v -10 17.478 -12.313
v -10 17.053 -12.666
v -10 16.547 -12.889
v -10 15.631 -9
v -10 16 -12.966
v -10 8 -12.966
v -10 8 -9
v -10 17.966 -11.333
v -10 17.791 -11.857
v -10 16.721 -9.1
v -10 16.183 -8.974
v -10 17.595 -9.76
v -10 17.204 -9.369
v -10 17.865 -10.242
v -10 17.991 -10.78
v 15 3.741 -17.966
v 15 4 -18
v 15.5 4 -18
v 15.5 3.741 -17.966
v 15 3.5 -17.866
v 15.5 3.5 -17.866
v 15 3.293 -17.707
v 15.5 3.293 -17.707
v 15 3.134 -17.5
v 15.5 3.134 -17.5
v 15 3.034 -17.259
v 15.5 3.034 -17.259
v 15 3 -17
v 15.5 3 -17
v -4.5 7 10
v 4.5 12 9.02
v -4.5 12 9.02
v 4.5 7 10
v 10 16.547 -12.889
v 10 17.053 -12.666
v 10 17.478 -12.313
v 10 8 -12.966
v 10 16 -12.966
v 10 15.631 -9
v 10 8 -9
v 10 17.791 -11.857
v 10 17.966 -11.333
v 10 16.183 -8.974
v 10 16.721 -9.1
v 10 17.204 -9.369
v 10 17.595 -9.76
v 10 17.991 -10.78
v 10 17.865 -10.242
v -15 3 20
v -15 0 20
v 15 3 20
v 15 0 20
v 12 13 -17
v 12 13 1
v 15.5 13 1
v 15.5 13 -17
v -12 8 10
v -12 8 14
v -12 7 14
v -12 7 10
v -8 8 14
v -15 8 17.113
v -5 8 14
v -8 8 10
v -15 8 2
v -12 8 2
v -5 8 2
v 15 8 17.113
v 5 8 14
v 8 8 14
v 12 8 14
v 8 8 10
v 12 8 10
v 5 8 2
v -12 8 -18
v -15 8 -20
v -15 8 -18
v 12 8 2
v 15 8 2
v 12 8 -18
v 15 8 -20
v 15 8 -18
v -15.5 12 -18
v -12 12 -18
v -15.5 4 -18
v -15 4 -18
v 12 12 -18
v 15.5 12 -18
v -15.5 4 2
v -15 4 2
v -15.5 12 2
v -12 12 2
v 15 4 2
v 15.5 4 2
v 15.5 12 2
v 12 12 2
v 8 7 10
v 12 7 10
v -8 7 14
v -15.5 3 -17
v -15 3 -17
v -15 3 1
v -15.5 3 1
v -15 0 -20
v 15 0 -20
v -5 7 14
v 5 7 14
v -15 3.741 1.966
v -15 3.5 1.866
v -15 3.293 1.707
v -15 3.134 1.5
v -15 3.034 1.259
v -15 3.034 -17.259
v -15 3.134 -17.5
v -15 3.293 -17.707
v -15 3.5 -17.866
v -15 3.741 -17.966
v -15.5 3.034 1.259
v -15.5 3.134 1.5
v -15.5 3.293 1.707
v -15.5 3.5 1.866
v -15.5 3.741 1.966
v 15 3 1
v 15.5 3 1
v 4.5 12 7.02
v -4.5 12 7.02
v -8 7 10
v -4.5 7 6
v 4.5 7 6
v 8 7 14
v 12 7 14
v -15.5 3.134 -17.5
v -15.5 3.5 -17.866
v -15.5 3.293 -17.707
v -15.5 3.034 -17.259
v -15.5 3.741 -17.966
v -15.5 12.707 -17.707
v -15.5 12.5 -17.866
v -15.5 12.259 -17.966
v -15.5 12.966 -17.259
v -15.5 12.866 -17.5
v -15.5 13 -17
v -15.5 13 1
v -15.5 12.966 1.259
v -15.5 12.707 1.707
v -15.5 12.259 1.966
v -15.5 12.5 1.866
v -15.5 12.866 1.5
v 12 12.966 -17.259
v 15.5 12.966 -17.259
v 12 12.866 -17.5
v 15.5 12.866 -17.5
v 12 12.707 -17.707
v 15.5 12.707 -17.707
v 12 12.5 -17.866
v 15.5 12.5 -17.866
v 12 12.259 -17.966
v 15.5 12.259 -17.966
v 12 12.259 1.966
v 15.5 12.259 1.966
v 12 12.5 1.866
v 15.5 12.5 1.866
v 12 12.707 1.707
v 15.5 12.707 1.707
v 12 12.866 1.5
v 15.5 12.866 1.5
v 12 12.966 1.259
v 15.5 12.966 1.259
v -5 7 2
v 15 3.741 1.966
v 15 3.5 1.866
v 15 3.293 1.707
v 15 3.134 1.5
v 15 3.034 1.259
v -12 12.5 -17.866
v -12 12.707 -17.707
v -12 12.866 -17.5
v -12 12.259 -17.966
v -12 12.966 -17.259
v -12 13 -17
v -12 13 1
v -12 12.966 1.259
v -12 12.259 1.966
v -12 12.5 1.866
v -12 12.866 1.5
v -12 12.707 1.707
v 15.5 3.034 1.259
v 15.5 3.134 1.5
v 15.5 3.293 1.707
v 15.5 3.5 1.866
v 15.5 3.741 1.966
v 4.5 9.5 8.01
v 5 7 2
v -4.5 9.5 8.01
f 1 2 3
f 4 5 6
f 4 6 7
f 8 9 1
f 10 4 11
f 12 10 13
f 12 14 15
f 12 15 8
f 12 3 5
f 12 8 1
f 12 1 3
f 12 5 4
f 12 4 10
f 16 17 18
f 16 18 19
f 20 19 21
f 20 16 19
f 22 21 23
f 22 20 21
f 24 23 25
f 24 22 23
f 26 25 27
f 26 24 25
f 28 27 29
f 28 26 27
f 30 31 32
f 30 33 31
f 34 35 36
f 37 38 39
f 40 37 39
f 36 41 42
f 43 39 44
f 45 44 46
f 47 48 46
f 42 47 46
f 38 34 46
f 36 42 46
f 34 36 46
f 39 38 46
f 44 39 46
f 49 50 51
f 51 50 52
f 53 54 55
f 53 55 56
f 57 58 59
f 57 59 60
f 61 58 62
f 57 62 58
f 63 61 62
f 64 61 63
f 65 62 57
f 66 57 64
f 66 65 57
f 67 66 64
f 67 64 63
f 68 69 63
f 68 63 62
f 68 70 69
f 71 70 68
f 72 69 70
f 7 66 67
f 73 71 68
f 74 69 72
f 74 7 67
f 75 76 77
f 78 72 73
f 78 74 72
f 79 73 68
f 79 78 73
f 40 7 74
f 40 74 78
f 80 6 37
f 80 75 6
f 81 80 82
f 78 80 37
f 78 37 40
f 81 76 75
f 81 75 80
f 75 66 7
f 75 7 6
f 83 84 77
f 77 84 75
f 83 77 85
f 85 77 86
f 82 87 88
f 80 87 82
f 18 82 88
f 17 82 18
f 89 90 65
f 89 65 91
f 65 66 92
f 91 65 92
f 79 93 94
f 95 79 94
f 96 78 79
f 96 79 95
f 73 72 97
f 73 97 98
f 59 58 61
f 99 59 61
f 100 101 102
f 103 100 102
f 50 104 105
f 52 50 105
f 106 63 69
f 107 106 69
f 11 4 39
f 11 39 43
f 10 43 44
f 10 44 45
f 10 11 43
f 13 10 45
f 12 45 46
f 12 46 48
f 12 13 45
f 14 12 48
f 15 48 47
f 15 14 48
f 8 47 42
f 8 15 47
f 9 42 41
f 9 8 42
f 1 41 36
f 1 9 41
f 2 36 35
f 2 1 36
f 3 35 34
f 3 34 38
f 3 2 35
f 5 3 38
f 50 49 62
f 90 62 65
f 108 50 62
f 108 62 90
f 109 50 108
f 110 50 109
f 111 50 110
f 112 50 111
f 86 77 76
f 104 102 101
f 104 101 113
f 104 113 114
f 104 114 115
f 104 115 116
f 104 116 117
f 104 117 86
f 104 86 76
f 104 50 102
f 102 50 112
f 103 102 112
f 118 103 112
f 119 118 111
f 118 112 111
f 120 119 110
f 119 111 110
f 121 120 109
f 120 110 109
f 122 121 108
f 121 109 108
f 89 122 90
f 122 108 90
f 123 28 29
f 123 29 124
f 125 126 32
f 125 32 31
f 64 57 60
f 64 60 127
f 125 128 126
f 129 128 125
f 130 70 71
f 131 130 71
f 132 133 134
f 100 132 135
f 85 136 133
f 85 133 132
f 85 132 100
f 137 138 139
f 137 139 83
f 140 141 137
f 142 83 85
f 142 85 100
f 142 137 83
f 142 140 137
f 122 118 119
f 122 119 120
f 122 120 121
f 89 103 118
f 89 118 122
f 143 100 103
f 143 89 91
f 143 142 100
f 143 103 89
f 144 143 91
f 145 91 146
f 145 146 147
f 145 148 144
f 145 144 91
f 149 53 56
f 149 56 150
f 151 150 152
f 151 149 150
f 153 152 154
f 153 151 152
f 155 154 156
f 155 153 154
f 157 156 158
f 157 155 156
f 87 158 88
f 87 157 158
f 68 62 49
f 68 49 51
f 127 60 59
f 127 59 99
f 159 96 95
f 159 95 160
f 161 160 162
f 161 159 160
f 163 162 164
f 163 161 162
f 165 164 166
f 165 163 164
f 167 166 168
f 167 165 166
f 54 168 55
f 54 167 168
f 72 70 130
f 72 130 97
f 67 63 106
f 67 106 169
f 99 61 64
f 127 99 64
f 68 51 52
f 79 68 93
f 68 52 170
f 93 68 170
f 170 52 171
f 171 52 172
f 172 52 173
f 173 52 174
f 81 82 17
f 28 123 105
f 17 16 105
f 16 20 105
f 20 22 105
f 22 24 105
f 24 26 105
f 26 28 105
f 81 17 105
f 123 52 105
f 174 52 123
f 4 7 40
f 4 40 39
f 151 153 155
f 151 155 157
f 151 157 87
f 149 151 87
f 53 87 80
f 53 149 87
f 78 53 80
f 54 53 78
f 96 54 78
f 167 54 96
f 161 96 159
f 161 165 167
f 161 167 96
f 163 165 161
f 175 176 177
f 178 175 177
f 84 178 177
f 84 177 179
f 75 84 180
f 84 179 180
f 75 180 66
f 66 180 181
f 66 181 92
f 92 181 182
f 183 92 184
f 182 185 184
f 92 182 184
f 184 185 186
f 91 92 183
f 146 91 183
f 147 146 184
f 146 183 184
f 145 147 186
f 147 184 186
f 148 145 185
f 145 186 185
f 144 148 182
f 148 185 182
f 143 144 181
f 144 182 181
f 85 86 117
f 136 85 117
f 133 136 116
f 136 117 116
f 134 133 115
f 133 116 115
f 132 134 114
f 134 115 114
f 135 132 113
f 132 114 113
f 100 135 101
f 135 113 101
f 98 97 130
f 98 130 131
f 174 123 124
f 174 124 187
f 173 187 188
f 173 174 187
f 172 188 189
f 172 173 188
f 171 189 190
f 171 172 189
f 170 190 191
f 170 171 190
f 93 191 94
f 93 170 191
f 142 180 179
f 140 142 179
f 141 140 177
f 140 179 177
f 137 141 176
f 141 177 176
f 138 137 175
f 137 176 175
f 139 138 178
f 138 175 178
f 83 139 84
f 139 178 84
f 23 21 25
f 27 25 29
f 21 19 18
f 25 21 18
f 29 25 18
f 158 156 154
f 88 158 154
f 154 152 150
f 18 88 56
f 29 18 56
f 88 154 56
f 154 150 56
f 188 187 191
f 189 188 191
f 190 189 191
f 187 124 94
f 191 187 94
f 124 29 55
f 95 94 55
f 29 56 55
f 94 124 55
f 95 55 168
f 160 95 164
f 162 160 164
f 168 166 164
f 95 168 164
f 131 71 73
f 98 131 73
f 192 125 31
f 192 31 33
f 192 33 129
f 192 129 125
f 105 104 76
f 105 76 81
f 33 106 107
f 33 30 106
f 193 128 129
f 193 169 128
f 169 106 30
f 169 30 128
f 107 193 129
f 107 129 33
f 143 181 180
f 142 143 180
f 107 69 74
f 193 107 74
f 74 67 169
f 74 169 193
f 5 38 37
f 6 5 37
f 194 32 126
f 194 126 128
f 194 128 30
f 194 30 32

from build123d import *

# Parameters (mm, degrees)
SKETCH_1_W           = 30
SKETCH_1_H           = 40
EXTRUDE_1_DEPTH      = 8
CHAMFER_1_SIZE       = 5
CHAMFER_1_SIZE2      = 2.886751346
EXTRUDE_START        = -3
EXTRUDE_2_DEPTH      = 3.5
EXTRUDE_3_DEPTH      = 10
EXTRUDE_3_DEPTH_BACK = 10
SKETCH_4_W           = 4
SKETCH_4_H           = 4
CUT_EXTRUDE_2_DEPTH  = 1
SKETCH_12_W          = 10
SKETCH_12_H          = 12
CUT_EXTRUDE_3_DEPTH  = 1


with BuildPart() as part:
    # 草图1 → 凸台-拉伸1 (new body)
    with BuildSketch(Plane(origin=(0, 0, 0), x_dir=(1, 0, 0), z_dir=(0, 1, 0))):
        Rectangle(SKETCH_1_W, SKETCH_1_H)
    extrude(amount=EXTRUDE_1_DEPTH)

    # 倒角1
    chamfer_1_edges = [part.edges().sort_by_distance(p)[0] for p in [
        (0, 8, 20),
    ]]
    chamfer_1_side = [part.faces().sort_by_distance(p)[0] for p in [
        (0, 4, 20),
    ]]
    chamfer(chamfer_1_edges, length=CHAMFER_1_SIZE, length2=CHAMFER_1_SIZE2, reference=chamfer_1_side[0])

    # 草图6 → 凸台-拉伸2 (add)
    with BuildSketch(Plane(origin=(15, 0, 0), x_dir=(0, 0, -1), z_dir=(1, 0, 0)).offset(EXTRUDE_START)):
        with BuildLine():
            Line((18, 12), (18, 4))
            ThreePointArc((18, 4), (17.707106781, 3.292893219), (17, 3))
            Line((17, 3), (-1, 3))
            ThreePointArc((-1, 3), (-1.707106781, 3.292893219), (-2, 4))
            Line((-2, 4), (-2, 12))
            ThreePointArc((-2, 12), (-1.707106781, 12.707106781), (-1, 13))
            Line((-1, 13), (17, 13))
            ThreePointArc((17, 13), (17.707106781, 12.707106781), (18, 12))
        make_face()
    extrude_2 = extrude(amount=EXTRUDE_2_DEPTH)

    # 镜向2: 凸台-拉伸2 across plane
    add(extrude_2.mirror(Plane(origin=(0, 0, 0), x_dir=(0, 0, 1), z_dir=(1, 0, 0))))

    # 草图10 → 凸台-拉伸3 (add, two sides: drawn at the far end of the back side and taken through both)
    with BuildSketch(Plane(origin=(0, 0, 0), x_dir=(0, 0, -1), z_dir=(1, 0, 0)).offset(-EXTRUDE_3_DEPTH_BACK)):
        with BuildLine():
            Line((9, 8), (9, 15.630981347))
            ThreePointArc((9, 15.630981347), (10.780355092, 17.991396878), (12.965661526, 16))
            Line((12.965661526, 16), (12.965661526, 8))
            Line((12.965661526, 8), (9, 8))
        make_face()
    extrude(amount=EXTRUDE_3_DEPTH + EXTRUDE_3_DEPTH_BACK)

    # 草图4 → 切除-拉伸2 (cut)
    with BuildSketch(Plane(origin=(0, 8, 0), x_dir=(1, 0, 0), z_dir=(0, 1, 0))):
        with Locations((-10, -12)):
            Rectangle(SKETCH_4_W, SKETCH_4_H)
        with Locations((10, -12)):
            Rectangle(SKETCH_4_W, SKETCH_4_H)
    extrude(amount=-CUT_EXTRUDE_2_DEPTH, mode=Mode.SUBTRACT)

    # 草图12 → 切除-拉伸3 (cut)
    with BuildSketch(Plane(origin=(0, 8, 0), x_dir=(1, 0, 0), z_dir=(0, 1, 0))):
        with Locations((0, -8)):
            Rectangle(SKETCH_12_W, SKETCH_12_H)
    extrude(amount=-CUT_EXTRUDE_3_DEPTH, mode=Mode.SUBTRACT)

    # 草图14 → 放样3 section 0
    with BuildSketch(Plane(origin=(0, 12, 0), x_dir=(1, 0, 0), z_dir=(0, 1, 0))):
        with BuildLine():
            Line((-4.5, -7.020034464), (4.5, -7.020034464))
            Line((4.5, -7.020034464), (4.5, -9.020034464))
            Line((4.5, -9.020034464), (-4.5, -9.020034464))
            Line((-4.5, -9.020034464), (-4.5, -7.020034464))
        make_face()
    # 草图13 → 放样3 section 1
    with BuildSketch(Plane(origin=(0, 7, 0), x_dir=(1, 0, 0), z_dir=(0, 1, 0))):
        with BuildLine():
            Line((-4.5, -10), (4.5, -10))
            Line((4.5, -10), (4.5, -6))
            Line((4.5, -6), (-4.5, -6))
            Line((-4.5, -6), (-4.5, -10))
        make_face()
    loft()


solid = part.part
